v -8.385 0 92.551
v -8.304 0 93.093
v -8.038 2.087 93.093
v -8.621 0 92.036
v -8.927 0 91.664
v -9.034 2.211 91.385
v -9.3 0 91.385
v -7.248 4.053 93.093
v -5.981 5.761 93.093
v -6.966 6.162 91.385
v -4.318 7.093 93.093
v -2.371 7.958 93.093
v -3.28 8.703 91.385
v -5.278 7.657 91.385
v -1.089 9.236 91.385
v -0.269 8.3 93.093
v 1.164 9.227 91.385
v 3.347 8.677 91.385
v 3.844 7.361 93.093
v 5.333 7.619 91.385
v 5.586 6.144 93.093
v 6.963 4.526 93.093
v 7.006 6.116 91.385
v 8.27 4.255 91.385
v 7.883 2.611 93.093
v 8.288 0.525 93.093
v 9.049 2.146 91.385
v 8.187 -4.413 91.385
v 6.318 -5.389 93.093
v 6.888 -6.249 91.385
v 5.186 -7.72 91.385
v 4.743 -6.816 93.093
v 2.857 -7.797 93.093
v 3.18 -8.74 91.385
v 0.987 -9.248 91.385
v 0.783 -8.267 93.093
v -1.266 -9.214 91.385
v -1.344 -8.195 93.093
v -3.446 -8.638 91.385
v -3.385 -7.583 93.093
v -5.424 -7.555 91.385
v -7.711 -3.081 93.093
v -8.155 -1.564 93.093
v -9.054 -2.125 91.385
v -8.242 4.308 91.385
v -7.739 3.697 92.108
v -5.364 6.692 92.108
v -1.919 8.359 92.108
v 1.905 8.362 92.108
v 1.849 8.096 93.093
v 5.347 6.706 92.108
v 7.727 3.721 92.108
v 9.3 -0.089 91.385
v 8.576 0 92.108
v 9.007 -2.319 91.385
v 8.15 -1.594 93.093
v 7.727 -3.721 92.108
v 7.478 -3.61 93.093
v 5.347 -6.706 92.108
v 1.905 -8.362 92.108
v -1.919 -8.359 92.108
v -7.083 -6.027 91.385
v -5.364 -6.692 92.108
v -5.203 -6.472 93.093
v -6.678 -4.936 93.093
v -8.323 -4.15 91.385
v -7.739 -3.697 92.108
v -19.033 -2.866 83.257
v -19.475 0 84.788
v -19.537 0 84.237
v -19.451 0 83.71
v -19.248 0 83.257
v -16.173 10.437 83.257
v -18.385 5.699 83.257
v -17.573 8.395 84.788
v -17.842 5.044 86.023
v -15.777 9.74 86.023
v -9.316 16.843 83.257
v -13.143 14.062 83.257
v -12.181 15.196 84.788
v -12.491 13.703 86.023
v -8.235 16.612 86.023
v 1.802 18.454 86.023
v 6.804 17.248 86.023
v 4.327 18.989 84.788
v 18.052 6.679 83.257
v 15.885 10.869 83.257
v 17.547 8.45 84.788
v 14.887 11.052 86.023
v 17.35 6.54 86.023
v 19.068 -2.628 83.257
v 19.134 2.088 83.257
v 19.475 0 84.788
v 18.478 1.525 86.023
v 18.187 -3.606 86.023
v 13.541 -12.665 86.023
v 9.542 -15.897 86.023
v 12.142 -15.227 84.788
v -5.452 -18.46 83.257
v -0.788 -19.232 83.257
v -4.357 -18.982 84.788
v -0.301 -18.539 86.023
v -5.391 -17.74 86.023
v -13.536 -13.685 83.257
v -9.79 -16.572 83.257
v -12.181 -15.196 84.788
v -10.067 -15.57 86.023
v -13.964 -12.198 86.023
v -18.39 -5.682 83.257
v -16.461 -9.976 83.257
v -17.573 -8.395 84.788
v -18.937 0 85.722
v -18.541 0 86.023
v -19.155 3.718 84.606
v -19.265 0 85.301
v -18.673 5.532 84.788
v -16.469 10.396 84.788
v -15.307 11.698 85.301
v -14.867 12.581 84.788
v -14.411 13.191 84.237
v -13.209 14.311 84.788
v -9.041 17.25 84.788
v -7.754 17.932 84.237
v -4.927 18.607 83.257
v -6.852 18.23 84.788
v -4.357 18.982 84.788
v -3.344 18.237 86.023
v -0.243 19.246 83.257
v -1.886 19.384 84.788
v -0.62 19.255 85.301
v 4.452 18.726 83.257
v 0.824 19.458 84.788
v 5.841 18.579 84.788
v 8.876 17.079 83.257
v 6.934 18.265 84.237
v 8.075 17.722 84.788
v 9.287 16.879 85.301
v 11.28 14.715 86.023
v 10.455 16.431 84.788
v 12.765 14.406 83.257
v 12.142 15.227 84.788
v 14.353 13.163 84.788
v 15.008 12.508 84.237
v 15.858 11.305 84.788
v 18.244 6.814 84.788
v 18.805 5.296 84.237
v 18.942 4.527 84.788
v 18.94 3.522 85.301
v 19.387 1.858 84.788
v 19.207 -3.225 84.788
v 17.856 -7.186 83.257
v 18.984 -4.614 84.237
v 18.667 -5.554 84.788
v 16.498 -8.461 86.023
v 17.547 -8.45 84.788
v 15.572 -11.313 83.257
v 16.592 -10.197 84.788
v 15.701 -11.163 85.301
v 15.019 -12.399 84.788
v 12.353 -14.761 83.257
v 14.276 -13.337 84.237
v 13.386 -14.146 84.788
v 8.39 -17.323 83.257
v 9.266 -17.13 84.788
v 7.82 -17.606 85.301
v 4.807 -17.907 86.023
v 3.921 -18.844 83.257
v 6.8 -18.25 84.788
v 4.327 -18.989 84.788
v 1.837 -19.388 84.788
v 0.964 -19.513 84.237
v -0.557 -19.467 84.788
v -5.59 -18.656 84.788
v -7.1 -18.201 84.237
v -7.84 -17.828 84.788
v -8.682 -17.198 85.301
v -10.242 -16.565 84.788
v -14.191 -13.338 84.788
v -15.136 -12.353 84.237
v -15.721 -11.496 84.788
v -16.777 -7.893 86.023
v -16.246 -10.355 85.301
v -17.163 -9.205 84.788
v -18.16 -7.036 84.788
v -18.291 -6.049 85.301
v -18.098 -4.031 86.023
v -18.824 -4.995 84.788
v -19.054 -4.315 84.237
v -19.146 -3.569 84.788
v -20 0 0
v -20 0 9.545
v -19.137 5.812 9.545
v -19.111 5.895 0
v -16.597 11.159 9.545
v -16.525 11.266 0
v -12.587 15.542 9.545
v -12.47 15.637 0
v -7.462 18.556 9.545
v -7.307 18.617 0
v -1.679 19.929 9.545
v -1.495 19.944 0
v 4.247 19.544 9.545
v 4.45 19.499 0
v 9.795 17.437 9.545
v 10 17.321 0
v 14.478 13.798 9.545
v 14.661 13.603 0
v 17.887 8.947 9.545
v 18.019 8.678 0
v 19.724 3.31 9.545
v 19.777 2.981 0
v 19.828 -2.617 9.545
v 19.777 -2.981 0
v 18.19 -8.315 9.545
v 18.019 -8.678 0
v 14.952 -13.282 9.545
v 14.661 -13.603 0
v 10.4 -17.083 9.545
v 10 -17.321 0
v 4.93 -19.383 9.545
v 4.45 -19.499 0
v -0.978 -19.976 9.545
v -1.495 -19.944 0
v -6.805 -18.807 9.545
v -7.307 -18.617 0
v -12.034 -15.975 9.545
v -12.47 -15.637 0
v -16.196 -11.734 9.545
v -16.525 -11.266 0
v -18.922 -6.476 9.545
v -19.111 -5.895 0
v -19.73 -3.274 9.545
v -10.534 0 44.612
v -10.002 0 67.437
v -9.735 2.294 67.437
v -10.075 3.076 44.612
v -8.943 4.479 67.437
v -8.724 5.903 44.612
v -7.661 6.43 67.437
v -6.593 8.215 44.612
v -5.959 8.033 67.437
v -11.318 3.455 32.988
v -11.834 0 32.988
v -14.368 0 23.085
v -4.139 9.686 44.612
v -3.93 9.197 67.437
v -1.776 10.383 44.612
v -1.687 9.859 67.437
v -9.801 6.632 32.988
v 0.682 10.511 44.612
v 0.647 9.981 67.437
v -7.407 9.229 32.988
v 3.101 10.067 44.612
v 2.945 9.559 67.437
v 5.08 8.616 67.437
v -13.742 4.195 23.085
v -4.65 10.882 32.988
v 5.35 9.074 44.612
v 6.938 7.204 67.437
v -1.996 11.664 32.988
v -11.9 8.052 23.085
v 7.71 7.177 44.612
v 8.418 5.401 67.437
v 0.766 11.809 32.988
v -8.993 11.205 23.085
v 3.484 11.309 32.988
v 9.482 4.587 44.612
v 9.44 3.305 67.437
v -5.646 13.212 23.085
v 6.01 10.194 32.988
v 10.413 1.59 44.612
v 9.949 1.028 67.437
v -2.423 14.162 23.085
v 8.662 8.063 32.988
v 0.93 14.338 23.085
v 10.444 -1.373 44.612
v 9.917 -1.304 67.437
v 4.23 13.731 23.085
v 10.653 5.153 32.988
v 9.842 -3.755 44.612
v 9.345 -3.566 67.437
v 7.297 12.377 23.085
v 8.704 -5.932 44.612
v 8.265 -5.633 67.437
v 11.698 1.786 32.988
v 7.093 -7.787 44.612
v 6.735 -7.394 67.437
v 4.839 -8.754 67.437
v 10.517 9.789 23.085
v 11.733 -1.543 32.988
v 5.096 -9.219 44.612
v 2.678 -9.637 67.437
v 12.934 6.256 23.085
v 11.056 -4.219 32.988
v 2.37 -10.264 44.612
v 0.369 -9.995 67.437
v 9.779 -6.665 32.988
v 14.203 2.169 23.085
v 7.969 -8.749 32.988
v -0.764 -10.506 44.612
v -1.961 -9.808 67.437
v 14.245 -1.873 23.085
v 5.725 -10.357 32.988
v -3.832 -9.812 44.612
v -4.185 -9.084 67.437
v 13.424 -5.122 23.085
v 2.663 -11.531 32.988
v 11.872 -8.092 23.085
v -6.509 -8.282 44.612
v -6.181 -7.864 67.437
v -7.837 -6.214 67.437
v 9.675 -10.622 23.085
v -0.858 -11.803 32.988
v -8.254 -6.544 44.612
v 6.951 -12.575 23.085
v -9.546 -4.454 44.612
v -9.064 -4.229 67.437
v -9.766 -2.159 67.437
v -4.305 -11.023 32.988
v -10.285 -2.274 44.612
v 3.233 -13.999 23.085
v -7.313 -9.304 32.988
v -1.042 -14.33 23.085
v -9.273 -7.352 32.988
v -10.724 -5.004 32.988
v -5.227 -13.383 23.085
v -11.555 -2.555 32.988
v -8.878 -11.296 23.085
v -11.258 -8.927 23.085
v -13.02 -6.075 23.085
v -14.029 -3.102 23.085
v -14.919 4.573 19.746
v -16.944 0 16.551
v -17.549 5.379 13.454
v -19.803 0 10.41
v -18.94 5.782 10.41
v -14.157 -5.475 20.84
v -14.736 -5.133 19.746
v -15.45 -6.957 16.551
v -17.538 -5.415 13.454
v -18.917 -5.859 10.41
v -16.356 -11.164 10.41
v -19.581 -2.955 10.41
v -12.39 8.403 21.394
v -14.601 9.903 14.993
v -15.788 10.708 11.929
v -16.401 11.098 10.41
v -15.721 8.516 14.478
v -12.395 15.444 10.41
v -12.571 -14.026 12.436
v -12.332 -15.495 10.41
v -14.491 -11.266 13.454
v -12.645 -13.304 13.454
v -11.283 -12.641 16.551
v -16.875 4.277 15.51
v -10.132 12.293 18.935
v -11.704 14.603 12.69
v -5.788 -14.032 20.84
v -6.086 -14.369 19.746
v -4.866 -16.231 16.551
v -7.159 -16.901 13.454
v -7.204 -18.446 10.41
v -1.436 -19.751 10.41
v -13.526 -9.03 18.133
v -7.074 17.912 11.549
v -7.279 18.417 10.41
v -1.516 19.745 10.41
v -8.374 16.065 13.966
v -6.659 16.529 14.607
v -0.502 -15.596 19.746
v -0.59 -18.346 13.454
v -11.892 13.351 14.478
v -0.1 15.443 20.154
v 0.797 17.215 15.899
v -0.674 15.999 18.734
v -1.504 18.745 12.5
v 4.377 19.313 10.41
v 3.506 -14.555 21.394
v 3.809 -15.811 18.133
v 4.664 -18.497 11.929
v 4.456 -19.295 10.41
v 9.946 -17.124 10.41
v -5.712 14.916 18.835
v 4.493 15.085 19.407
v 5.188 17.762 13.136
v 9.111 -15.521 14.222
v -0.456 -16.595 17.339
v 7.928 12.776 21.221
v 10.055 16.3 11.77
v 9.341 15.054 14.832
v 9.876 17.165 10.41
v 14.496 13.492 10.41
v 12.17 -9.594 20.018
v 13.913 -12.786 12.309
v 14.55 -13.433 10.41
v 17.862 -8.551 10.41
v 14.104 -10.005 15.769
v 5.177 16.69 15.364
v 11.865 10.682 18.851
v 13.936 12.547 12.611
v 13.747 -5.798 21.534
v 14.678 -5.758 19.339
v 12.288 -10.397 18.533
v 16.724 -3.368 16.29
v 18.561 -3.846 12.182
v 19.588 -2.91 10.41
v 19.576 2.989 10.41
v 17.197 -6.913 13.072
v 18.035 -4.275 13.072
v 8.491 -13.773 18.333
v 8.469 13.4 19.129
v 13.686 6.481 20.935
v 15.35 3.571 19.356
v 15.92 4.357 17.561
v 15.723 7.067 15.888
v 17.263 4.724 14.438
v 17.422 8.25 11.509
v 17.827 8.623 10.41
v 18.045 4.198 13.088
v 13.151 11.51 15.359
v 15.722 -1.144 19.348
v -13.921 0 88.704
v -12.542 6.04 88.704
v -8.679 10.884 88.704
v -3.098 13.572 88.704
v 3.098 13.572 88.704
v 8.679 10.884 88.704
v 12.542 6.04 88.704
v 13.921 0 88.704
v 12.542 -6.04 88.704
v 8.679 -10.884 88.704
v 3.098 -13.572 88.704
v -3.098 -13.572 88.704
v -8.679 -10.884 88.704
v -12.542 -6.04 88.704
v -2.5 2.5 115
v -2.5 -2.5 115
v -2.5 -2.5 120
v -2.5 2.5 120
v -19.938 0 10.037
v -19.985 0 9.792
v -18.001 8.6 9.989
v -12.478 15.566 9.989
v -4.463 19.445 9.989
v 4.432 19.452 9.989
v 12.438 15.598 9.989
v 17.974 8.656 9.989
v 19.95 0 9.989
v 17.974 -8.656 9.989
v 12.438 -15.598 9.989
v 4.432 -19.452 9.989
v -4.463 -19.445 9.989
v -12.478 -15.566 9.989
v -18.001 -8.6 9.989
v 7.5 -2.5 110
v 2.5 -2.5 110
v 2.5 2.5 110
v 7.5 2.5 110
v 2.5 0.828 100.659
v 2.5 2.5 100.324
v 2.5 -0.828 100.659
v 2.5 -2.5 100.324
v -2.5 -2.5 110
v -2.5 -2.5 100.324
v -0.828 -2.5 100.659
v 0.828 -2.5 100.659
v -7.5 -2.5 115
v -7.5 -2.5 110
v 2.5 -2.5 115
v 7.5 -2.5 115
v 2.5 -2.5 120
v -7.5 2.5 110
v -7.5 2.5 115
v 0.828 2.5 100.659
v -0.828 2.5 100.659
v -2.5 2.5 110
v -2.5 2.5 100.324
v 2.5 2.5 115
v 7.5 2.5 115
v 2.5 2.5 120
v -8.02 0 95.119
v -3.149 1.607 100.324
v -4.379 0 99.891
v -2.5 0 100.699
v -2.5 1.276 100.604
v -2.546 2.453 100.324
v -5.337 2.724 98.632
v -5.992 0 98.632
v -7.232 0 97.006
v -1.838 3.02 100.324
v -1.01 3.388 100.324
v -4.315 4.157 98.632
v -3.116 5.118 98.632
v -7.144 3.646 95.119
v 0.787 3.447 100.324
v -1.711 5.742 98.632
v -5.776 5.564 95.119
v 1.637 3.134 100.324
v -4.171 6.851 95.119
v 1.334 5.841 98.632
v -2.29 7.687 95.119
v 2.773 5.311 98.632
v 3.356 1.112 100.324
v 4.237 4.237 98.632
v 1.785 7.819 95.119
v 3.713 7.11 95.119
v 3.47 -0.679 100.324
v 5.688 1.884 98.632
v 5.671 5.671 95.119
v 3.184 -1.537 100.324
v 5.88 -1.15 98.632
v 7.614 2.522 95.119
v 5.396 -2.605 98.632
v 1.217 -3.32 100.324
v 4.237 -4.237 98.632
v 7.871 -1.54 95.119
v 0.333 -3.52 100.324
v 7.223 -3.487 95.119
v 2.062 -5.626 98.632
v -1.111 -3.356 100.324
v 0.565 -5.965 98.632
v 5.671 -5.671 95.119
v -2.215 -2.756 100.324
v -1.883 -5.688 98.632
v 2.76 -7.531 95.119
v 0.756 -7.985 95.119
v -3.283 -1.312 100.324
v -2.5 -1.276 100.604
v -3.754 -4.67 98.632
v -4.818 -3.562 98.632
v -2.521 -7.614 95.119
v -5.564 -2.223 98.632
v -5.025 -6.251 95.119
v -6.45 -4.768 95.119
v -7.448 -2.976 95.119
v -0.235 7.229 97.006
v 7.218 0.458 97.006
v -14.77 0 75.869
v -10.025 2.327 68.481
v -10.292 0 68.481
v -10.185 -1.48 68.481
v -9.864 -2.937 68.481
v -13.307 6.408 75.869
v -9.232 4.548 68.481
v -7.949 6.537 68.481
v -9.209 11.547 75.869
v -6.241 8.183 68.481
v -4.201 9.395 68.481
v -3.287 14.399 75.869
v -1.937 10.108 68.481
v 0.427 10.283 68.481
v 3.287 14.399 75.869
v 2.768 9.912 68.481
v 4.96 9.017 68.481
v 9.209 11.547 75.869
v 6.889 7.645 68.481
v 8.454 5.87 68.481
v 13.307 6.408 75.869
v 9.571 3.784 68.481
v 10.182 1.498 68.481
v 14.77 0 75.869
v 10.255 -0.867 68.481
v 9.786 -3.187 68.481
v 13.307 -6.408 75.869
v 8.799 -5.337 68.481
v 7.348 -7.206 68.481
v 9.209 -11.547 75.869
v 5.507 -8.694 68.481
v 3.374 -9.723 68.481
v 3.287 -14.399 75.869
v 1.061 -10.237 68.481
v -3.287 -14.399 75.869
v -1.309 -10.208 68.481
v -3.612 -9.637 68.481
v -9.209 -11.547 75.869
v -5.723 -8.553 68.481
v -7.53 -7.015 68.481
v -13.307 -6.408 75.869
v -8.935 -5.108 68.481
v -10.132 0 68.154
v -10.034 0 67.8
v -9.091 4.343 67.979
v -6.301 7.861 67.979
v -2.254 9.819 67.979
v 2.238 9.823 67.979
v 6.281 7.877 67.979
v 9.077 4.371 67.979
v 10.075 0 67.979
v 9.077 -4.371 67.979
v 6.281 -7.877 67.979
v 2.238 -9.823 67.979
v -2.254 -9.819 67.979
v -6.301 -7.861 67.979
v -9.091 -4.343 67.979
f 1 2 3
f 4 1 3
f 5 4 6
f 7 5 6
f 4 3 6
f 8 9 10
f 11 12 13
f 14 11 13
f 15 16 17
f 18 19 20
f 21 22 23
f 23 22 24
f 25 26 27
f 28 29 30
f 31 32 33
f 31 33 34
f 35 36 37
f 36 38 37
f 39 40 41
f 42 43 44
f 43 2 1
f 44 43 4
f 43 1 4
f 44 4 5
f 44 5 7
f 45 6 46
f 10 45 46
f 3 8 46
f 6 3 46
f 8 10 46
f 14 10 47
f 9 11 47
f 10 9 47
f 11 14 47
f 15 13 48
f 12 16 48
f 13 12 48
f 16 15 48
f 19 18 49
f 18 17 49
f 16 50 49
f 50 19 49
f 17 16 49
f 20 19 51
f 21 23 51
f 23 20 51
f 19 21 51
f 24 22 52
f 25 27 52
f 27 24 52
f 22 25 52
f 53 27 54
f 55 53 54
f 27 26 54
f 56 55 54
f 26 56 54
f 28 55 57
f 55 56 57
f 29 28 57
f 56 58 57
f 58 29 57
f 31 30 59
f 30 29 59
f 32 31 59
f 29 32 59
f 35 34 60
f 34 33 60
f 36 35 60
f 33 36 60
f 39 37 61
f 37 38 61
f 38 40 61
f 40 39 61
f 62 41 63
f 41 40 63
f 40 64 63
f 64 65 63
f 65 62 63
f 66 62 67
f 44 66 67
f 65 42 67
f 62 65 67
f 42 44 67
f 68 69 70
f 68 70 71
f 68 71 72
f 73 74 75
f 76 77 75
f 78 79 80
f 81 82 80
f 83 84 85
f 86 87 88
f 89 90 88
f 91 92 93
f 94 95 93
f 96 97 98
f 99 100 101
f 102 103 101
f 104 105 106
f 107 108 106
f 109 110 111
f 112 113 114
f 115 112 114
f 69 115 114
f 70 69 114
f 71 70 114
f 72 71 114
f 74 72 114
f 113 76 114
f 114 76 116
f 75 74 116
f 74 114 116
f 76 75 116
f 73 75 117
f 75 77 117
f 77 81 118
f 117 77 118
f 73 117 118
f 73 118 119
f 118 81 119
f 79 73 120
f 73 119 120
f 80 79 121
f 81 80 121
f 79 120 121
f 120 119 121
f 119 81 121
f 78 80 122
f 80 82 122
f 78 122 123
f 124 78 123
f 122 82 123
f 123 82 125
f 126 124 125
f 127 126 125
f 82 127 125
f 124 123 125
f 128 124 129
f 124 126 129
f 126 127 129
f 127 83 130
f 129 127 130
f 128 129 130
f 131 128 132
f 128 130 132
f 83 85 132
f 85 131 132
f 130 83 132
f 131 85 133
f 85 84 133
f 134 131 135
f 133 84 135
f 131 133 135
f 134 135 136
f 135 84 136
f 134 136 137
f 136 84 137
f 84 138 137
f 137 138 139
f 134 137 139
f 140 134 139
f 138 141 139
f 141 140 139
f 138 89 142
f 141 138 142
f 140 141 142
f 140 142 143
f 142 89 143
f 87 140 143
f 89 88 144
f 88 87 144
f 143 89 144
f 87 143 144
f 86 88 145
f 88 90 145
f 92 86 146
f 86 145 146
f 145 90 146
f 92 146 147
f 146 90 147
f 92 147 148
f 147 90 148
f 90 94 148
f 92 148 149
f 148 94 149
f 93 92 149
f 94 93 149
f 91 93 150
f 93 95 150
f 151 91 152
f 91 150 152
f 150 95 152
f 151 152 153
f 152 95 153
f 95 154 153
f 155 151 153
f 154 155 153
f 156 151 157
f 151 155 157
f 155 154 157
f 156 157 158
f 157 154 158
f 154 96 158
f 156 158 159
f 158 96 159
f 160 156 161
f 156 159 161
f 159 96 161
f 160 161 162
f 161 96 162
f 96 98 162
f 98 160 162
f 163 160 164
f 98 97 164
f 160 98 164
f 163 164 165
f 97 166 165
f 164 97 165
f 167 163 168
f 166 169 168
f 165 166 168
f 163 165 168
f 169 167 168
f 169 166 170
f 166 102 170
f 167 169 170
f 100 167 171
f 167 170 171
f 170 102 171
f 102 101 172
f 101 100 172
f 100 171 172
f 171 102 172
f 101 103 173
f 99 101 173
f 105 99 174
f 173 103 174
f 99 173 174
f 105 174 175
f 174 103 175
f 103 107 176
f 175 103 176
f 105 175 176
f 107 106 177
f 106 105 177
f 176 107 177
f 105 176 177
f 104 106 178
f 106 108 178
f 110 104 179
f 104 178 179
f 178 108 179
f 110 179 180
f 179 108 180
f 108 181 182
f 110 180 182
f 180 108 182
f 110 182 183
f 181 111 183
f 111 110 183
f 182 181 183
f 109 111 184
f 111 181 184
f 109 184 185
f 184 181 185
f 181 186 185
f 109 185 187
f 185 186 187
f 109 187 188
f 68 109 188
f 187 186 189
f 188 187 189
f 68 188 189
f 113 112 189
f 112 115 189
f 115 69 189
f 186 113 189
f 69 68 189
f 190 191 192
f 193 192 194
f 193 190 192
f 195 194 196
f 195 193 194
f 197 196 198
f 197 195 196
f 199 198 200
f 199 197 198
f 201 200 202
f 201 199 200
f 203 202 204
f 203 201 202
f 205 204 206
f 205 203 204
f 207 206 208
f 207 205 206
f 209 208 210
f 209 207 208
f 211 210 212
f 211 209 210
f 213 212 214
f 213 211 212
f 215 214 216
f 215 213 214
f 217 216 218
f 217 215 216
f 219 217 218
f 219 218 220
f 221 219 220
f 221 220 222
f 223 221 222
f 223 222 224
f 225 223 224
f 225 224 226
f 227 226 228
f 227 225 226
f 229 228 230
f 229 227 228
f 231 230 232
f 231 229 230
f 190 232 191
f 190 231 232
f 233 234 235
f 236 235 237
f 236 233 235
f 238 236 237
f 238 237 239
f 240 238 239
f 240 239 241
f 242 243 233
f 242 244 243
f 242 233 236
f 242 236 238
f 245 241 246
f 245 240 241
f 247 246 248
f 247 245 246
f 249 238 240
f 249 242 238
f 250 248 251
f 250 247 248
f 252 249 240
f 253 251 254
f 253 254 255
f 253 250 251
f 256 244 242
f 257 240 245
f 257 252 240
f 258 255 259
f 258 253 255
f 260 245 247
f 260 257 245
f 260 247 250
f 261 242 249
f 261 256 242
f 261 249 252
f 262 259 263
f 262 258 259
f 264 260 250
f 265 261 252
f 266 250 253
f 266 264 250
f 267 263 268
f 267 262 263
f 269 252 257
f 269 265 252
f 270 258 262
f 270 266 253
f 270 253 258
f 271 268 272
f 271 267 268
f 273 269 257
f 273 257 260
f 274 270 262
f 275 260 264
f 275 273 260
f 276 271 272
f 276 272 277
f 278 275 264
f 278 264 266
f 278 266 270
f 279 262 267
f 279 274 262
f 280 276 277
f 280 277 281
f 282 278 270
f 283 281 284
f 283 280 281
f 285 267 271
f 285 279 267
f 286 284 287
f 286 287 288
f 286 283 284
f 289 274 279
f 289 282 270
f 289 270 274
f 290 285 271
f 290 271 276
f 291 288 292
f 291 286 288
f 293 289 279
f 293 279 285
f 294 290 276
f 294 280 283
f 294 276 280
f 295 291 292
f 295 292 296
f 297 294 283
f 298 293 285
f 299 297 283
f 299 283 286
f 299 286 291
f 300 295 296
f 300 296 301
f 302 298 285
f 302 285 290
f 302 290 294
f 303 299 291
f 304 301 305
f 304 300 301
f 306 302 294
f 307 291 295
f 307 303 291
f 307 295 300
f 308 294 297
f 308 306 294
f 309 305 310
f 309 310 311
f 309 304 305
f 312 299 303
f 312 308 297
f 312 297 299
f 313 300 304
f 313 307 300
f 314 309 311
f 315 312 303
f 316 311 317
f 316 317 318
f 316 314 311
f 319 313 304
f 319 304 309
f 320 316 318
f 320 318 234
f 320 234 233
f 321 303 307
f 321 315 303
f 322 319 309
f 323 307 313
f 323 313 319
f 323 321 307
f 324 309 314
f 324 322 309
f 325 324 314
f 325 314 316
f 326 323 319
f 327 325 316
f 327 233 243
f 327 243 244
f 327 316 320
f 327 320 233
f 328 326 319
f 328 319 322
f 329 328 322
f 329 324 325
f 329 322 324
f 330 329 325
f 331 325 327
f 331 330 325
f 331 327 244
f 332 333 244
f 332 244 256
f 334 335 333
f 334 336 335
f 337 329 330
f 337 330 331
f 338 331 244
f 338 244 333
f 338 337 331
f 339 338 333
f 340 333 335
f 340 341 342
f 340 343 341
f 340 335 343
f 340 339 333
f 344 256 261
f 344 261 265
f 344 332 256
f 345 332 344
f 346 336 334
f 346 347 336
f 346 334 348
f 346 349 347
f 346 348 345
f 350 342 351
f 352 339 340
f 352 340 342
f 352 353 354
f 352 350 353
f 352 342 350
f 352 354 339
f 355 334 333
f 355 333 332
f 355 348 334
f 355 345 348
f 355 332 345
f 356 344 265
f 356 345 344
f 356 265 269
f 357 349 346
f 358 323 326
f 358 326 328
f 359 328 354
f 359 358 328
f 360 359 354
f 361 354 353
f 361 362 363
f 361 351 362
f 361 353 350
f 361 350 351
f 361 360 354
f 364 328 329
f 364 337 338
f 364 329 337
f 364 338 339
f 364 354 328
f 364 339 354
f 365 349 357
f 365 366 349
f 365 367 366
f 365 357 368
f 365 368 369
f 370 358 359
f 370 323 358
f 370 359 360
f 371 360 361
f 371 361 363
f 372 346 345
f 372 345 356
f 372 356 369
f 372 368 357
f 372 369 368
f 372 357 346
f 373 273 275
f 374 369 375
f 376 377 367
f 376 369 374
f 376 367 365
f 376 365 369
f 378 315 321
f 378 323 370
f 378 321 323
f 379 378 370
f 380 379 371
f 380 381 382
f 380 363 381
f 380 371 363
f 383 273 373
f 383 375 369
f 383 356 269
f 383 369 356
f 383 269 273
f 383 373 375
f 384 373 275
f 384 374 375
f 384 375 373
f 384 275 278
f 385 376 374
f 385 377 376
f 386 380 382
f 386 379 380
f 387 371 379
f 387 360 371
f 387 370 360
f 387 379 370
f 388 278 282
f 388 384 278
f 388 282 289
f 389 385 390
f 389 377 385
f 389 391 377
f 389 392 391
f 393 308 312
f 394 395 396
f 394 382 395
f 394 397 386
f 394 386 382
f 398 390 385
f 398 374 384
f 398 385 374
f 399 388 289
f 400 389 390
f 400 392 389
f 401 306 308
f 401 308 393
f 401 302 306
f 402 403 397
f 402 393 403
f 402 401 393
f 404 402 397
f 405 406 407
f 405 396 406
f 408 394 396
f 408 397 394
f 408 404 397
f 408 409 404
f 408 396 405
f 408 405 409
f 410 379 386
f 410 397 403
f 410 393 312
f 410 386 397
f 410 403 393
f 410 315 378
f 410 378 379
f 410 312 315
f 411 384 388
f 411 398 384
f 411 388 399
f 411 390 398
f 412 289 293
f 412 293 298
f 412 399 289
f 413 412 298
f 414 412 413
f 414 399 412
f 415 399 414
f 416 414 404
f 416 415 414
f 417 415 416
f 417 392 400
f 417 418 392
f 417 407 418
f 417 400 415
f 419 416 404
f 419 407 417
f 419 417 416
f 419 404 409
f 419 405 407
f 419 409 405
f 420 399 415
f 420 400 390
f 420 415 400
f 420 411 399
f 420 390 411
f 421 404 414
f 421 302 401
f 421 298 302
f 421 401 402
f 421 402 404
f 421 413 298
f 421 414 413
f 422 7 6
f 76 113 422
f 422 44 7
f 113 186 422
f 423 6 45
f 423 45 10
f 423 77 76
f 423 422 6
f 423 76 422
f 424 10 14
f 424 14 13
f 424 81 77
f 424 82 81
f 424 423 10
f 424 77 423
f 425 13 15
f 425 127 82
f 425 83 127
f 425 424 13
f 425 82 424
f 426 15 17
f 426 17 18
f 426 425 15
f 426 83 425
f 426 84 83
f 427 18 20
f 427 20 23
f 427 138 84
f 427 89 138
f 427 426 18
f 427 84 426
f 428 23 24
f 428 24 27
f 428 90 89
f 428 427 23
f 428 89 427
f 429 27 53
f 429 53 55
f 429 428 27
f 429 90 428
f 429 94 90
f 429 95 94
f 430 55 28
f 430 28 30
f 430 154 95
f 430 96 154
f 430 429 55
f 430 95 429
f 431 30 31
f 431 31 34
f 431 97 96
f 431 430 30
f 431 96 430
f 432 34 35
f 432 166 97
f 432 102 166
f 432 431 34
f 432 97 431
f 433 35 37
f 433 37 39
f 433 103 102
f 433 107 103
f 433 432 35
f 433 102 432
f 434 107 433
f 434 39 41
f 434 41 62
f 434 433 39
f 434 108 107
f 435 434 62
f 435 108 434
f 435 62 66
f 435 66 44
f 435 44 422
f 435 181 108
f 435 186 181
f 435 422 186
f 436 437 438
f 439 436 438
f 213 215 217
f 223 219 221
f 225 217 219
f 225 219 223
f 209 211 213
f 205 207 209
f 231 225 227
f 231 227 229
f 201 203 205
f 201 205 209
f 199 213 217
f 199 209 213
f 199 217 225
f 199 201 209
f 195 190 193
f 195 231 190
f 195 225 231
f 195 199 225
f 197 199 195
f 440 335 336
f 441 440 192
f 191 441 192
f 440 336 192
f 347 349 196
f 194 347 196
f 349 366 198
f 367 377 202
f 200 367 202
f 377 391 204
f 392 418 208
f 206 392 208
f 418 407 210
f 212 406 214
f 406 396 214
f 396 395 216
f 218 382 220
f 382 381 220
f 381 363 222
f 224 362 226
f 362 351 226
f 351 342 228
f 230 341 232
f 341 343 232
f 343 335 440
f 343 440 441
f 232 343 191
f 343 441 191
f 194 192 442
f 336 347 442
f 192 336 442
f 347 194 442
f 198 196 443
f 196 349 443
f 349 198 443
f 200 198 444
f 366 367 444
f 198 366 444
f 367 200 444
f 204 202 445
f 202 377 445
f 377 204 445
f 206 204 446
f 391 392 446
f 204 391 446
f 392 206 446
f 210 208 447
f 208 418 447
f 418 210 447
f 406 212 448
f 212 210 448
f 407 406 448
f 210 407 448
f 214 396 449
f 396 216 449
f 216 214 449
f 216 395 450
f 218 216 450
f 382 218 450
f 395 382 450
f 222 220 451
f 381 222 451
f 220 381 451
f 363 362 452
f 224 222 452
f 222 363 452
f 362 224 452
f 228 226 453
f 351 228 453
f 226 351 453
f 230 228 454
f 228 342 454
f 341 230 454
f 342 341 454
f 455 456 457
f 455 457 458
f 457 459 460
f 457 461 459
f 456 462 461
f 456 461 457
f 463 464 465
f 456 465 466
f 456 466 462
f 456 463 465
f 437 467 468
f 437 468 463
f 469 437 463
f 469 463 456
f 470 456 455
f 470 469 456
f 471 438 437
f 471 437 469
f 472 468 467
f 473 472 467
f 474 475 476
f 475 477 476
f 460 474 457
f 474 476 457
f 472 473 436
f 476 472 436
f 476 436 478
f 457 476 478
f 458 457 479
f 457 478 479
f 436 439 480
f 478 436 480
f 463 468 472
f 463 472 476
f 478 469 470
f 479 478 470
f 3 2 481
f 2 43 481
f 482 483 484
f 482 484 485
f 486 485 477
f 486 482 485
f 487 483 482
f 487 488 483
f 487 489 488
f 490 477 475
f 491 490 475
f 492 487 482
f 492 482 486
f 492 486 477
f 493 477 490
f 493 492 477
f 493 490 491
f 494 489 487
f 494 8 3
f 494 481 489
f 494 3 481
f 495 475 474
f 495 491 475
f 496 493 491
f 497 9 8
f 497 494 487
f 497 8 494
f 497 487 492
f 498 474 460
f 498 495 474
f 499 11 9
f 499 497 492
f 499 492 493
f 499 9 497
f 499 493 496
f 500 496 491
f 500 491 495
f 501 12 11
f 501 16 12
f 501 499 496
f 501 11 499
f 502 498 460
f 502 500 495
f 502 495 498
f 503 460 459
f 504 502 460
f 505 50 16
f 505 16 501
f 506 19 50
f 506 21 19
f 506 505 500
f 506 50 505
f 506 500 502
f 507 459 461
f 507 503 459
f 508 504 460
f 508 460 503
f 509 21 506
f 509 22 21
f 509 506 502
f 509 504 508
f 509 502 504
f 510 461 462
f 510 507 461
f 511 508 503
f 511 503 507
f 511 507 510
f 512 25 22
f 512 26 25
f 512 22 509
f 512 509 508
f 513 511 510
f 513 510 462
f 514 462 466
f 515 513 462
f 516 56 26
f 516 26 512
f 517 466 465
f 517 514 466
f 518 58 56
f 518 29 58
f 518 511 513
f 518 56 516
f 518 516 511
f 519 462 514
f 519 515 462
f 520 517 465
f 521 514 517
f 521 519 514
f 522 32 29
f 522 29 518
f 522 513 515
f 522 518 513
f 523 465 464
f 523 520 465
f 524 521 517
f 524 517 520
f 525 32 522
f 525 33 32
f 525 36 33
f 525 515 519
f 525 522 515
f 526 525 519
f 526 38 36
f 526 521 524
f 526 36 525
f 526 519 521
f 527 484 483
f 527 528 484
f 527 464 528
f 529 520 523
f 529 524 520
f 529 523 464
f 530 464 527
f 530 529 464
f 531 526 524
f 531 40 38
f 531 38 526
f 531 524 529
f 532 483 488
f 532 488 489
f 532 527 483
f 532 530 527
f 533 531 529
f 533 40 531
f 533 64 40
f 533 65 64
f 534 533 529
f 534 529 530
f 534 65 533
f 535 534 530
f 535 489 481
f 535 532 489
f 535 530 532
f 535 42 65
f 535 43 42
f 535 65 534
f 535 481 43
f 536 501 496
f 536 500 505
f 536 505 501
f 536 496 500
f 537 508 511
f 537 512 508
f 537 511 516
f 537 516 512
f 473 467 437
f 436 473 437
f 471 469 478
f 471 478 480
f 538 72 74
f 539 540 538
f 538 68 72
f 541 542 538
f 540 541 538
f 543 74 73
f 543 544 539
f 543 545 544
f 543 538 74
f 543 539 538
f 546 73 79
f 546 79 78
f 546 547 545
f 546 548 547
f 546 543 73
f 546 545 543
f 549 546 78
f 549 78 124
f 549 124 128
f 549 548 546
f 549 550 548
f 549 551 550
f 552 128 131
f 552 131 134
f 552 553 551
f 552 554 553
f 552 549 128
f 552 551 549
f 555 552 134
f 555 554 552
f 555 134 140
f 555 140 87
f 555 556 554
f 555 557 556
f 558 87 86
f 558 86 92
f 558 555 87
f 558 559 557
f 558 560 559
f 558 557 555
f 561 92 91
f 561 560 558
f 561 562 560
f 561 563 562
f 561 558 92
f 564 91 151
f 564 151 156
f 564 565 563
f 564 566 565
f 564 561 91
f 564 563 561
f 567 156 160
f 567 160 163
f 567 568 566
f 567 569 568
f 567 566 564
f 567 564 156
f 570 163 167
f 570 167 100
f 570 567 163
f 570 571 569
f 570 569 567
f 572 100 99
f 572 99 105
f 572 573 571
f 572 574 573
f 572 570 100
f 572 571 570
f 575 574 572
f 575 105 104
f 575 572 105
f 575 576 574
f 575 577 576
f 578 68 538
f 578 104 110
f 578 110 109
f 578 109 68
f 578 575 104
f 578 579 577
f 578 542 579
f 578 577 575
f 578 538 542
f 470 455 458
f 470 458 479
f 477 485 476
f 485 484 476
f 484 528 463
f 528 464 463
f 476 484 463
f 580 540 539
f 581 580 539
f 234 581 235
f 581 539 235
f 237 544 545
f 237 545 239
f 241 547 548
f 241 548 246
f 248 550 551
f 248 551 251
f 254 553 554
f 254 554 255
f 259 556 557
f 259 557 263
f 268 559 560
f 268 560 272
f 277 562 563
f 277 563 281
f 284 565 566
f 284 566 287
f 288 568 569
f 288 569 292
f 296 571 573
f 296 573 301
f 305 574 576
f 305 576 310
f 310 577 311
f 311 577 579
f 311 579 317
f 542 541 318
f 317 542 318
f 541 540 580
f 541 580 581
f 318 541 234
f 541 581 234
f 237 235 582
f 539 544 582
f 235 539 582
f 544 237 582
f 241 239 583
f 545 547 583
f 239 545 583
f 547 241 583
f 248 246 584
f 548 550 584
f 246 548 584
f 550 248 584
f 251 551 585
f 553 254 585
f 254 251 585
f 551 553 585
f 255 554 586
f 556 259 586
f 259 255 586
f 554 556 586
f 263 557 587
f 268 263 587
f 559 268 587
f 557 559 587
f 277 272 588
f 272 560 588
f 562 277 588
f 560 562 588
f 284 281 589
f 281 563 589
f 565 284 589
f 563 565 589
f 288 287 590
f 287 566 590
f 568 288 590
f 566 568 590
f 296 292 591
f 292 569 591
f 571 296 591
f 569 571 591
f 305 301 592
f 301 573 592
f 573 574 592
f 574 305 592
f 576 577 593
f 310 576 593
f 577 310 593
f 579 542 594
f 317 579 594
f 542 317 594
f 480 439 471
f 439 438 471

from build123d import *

# Parameters (mm, degrees)
F0_W     = 5
F0_H     = 20
F1_DEPTH = 2.5
F2_W     = 15
F2_H     = 5
F3_DEPTH = 2.5
F6_DEPTH = 2.5
F7_DEPTH = 5
F8_R     = 2


with BuildPart() as f1:
    # F0 (on Front) → F1 (new body)
    with BuildSketch(Plane.XZ):
        with Locations((0, 110)):
            Rectangle(F0_W, F0_H)
    extrude(amount=F1_DEPTH)

    # F2 (on face) → F3 (join)
    with BuildSketch(Plane.XZ.offset(2.5)):
        with Locations((0, 112.5)):
            Rectangle(F2_W, F2_H)
    extrude(amount=-F3_DEPTH)

    # F4 (on Front) → F5 (revolve)
    with BuildSketch(Plane.XZ):
        with BuildLine():
            ThreePointArc((0, 101), (-6.2047476742, 98.408443436), (-8.2411444559, 92))
            Line((-8.2411444559, 92), (-20.3046236384, 85))
            Line((-20.3046236384, 85), (-10, 68))
            add(Edge.make_bspline(
                [(-10, 68), (-10.0457358367, 54.4372630993), (-10.1262334968, 30.5660788152), (-17.0221094404, 16.2026514332), (-20, 10)],
                knots=[0, 0, 0, 0, 0.568163554, 1, 1, 1, 1], degree=3))
            Line((-20, 10), (-20, 0))
            Line((-20, 0), (0, 0))
            Line((0, 0), (0, 101))
        make_face()
    revolve(axis=Axis((0, 0, 50.5), (0, 0, -1)))

    # F0 (on Front) → F6 (join)
    with BuildSketch(Plane.XZ):
        with Locations((0, 110)):
            Rectangle(F0_W, F0_H)
    extrude(amount=-F6_DEPTH)

    # F2 (on face) → F7 (join)
    with BuildSketch(Plane.XZ.offset(2.5)):
        with Locations((0, 112.5)):
            Rectangle(F2_W, F2_H)
    extrude(amount=-F7_DEPTH)

    # F8
    f8_edges = [f1.edges().sort_by_distance(p)[0] for p in [
        (20.304624, 0, 85),
        (20, 0, 10),
        (10, 0, 68),
        (8.241144, 0, 92),
    ]]
    fillet(f8_edges, radius=F8_R)


solid = f1.part
